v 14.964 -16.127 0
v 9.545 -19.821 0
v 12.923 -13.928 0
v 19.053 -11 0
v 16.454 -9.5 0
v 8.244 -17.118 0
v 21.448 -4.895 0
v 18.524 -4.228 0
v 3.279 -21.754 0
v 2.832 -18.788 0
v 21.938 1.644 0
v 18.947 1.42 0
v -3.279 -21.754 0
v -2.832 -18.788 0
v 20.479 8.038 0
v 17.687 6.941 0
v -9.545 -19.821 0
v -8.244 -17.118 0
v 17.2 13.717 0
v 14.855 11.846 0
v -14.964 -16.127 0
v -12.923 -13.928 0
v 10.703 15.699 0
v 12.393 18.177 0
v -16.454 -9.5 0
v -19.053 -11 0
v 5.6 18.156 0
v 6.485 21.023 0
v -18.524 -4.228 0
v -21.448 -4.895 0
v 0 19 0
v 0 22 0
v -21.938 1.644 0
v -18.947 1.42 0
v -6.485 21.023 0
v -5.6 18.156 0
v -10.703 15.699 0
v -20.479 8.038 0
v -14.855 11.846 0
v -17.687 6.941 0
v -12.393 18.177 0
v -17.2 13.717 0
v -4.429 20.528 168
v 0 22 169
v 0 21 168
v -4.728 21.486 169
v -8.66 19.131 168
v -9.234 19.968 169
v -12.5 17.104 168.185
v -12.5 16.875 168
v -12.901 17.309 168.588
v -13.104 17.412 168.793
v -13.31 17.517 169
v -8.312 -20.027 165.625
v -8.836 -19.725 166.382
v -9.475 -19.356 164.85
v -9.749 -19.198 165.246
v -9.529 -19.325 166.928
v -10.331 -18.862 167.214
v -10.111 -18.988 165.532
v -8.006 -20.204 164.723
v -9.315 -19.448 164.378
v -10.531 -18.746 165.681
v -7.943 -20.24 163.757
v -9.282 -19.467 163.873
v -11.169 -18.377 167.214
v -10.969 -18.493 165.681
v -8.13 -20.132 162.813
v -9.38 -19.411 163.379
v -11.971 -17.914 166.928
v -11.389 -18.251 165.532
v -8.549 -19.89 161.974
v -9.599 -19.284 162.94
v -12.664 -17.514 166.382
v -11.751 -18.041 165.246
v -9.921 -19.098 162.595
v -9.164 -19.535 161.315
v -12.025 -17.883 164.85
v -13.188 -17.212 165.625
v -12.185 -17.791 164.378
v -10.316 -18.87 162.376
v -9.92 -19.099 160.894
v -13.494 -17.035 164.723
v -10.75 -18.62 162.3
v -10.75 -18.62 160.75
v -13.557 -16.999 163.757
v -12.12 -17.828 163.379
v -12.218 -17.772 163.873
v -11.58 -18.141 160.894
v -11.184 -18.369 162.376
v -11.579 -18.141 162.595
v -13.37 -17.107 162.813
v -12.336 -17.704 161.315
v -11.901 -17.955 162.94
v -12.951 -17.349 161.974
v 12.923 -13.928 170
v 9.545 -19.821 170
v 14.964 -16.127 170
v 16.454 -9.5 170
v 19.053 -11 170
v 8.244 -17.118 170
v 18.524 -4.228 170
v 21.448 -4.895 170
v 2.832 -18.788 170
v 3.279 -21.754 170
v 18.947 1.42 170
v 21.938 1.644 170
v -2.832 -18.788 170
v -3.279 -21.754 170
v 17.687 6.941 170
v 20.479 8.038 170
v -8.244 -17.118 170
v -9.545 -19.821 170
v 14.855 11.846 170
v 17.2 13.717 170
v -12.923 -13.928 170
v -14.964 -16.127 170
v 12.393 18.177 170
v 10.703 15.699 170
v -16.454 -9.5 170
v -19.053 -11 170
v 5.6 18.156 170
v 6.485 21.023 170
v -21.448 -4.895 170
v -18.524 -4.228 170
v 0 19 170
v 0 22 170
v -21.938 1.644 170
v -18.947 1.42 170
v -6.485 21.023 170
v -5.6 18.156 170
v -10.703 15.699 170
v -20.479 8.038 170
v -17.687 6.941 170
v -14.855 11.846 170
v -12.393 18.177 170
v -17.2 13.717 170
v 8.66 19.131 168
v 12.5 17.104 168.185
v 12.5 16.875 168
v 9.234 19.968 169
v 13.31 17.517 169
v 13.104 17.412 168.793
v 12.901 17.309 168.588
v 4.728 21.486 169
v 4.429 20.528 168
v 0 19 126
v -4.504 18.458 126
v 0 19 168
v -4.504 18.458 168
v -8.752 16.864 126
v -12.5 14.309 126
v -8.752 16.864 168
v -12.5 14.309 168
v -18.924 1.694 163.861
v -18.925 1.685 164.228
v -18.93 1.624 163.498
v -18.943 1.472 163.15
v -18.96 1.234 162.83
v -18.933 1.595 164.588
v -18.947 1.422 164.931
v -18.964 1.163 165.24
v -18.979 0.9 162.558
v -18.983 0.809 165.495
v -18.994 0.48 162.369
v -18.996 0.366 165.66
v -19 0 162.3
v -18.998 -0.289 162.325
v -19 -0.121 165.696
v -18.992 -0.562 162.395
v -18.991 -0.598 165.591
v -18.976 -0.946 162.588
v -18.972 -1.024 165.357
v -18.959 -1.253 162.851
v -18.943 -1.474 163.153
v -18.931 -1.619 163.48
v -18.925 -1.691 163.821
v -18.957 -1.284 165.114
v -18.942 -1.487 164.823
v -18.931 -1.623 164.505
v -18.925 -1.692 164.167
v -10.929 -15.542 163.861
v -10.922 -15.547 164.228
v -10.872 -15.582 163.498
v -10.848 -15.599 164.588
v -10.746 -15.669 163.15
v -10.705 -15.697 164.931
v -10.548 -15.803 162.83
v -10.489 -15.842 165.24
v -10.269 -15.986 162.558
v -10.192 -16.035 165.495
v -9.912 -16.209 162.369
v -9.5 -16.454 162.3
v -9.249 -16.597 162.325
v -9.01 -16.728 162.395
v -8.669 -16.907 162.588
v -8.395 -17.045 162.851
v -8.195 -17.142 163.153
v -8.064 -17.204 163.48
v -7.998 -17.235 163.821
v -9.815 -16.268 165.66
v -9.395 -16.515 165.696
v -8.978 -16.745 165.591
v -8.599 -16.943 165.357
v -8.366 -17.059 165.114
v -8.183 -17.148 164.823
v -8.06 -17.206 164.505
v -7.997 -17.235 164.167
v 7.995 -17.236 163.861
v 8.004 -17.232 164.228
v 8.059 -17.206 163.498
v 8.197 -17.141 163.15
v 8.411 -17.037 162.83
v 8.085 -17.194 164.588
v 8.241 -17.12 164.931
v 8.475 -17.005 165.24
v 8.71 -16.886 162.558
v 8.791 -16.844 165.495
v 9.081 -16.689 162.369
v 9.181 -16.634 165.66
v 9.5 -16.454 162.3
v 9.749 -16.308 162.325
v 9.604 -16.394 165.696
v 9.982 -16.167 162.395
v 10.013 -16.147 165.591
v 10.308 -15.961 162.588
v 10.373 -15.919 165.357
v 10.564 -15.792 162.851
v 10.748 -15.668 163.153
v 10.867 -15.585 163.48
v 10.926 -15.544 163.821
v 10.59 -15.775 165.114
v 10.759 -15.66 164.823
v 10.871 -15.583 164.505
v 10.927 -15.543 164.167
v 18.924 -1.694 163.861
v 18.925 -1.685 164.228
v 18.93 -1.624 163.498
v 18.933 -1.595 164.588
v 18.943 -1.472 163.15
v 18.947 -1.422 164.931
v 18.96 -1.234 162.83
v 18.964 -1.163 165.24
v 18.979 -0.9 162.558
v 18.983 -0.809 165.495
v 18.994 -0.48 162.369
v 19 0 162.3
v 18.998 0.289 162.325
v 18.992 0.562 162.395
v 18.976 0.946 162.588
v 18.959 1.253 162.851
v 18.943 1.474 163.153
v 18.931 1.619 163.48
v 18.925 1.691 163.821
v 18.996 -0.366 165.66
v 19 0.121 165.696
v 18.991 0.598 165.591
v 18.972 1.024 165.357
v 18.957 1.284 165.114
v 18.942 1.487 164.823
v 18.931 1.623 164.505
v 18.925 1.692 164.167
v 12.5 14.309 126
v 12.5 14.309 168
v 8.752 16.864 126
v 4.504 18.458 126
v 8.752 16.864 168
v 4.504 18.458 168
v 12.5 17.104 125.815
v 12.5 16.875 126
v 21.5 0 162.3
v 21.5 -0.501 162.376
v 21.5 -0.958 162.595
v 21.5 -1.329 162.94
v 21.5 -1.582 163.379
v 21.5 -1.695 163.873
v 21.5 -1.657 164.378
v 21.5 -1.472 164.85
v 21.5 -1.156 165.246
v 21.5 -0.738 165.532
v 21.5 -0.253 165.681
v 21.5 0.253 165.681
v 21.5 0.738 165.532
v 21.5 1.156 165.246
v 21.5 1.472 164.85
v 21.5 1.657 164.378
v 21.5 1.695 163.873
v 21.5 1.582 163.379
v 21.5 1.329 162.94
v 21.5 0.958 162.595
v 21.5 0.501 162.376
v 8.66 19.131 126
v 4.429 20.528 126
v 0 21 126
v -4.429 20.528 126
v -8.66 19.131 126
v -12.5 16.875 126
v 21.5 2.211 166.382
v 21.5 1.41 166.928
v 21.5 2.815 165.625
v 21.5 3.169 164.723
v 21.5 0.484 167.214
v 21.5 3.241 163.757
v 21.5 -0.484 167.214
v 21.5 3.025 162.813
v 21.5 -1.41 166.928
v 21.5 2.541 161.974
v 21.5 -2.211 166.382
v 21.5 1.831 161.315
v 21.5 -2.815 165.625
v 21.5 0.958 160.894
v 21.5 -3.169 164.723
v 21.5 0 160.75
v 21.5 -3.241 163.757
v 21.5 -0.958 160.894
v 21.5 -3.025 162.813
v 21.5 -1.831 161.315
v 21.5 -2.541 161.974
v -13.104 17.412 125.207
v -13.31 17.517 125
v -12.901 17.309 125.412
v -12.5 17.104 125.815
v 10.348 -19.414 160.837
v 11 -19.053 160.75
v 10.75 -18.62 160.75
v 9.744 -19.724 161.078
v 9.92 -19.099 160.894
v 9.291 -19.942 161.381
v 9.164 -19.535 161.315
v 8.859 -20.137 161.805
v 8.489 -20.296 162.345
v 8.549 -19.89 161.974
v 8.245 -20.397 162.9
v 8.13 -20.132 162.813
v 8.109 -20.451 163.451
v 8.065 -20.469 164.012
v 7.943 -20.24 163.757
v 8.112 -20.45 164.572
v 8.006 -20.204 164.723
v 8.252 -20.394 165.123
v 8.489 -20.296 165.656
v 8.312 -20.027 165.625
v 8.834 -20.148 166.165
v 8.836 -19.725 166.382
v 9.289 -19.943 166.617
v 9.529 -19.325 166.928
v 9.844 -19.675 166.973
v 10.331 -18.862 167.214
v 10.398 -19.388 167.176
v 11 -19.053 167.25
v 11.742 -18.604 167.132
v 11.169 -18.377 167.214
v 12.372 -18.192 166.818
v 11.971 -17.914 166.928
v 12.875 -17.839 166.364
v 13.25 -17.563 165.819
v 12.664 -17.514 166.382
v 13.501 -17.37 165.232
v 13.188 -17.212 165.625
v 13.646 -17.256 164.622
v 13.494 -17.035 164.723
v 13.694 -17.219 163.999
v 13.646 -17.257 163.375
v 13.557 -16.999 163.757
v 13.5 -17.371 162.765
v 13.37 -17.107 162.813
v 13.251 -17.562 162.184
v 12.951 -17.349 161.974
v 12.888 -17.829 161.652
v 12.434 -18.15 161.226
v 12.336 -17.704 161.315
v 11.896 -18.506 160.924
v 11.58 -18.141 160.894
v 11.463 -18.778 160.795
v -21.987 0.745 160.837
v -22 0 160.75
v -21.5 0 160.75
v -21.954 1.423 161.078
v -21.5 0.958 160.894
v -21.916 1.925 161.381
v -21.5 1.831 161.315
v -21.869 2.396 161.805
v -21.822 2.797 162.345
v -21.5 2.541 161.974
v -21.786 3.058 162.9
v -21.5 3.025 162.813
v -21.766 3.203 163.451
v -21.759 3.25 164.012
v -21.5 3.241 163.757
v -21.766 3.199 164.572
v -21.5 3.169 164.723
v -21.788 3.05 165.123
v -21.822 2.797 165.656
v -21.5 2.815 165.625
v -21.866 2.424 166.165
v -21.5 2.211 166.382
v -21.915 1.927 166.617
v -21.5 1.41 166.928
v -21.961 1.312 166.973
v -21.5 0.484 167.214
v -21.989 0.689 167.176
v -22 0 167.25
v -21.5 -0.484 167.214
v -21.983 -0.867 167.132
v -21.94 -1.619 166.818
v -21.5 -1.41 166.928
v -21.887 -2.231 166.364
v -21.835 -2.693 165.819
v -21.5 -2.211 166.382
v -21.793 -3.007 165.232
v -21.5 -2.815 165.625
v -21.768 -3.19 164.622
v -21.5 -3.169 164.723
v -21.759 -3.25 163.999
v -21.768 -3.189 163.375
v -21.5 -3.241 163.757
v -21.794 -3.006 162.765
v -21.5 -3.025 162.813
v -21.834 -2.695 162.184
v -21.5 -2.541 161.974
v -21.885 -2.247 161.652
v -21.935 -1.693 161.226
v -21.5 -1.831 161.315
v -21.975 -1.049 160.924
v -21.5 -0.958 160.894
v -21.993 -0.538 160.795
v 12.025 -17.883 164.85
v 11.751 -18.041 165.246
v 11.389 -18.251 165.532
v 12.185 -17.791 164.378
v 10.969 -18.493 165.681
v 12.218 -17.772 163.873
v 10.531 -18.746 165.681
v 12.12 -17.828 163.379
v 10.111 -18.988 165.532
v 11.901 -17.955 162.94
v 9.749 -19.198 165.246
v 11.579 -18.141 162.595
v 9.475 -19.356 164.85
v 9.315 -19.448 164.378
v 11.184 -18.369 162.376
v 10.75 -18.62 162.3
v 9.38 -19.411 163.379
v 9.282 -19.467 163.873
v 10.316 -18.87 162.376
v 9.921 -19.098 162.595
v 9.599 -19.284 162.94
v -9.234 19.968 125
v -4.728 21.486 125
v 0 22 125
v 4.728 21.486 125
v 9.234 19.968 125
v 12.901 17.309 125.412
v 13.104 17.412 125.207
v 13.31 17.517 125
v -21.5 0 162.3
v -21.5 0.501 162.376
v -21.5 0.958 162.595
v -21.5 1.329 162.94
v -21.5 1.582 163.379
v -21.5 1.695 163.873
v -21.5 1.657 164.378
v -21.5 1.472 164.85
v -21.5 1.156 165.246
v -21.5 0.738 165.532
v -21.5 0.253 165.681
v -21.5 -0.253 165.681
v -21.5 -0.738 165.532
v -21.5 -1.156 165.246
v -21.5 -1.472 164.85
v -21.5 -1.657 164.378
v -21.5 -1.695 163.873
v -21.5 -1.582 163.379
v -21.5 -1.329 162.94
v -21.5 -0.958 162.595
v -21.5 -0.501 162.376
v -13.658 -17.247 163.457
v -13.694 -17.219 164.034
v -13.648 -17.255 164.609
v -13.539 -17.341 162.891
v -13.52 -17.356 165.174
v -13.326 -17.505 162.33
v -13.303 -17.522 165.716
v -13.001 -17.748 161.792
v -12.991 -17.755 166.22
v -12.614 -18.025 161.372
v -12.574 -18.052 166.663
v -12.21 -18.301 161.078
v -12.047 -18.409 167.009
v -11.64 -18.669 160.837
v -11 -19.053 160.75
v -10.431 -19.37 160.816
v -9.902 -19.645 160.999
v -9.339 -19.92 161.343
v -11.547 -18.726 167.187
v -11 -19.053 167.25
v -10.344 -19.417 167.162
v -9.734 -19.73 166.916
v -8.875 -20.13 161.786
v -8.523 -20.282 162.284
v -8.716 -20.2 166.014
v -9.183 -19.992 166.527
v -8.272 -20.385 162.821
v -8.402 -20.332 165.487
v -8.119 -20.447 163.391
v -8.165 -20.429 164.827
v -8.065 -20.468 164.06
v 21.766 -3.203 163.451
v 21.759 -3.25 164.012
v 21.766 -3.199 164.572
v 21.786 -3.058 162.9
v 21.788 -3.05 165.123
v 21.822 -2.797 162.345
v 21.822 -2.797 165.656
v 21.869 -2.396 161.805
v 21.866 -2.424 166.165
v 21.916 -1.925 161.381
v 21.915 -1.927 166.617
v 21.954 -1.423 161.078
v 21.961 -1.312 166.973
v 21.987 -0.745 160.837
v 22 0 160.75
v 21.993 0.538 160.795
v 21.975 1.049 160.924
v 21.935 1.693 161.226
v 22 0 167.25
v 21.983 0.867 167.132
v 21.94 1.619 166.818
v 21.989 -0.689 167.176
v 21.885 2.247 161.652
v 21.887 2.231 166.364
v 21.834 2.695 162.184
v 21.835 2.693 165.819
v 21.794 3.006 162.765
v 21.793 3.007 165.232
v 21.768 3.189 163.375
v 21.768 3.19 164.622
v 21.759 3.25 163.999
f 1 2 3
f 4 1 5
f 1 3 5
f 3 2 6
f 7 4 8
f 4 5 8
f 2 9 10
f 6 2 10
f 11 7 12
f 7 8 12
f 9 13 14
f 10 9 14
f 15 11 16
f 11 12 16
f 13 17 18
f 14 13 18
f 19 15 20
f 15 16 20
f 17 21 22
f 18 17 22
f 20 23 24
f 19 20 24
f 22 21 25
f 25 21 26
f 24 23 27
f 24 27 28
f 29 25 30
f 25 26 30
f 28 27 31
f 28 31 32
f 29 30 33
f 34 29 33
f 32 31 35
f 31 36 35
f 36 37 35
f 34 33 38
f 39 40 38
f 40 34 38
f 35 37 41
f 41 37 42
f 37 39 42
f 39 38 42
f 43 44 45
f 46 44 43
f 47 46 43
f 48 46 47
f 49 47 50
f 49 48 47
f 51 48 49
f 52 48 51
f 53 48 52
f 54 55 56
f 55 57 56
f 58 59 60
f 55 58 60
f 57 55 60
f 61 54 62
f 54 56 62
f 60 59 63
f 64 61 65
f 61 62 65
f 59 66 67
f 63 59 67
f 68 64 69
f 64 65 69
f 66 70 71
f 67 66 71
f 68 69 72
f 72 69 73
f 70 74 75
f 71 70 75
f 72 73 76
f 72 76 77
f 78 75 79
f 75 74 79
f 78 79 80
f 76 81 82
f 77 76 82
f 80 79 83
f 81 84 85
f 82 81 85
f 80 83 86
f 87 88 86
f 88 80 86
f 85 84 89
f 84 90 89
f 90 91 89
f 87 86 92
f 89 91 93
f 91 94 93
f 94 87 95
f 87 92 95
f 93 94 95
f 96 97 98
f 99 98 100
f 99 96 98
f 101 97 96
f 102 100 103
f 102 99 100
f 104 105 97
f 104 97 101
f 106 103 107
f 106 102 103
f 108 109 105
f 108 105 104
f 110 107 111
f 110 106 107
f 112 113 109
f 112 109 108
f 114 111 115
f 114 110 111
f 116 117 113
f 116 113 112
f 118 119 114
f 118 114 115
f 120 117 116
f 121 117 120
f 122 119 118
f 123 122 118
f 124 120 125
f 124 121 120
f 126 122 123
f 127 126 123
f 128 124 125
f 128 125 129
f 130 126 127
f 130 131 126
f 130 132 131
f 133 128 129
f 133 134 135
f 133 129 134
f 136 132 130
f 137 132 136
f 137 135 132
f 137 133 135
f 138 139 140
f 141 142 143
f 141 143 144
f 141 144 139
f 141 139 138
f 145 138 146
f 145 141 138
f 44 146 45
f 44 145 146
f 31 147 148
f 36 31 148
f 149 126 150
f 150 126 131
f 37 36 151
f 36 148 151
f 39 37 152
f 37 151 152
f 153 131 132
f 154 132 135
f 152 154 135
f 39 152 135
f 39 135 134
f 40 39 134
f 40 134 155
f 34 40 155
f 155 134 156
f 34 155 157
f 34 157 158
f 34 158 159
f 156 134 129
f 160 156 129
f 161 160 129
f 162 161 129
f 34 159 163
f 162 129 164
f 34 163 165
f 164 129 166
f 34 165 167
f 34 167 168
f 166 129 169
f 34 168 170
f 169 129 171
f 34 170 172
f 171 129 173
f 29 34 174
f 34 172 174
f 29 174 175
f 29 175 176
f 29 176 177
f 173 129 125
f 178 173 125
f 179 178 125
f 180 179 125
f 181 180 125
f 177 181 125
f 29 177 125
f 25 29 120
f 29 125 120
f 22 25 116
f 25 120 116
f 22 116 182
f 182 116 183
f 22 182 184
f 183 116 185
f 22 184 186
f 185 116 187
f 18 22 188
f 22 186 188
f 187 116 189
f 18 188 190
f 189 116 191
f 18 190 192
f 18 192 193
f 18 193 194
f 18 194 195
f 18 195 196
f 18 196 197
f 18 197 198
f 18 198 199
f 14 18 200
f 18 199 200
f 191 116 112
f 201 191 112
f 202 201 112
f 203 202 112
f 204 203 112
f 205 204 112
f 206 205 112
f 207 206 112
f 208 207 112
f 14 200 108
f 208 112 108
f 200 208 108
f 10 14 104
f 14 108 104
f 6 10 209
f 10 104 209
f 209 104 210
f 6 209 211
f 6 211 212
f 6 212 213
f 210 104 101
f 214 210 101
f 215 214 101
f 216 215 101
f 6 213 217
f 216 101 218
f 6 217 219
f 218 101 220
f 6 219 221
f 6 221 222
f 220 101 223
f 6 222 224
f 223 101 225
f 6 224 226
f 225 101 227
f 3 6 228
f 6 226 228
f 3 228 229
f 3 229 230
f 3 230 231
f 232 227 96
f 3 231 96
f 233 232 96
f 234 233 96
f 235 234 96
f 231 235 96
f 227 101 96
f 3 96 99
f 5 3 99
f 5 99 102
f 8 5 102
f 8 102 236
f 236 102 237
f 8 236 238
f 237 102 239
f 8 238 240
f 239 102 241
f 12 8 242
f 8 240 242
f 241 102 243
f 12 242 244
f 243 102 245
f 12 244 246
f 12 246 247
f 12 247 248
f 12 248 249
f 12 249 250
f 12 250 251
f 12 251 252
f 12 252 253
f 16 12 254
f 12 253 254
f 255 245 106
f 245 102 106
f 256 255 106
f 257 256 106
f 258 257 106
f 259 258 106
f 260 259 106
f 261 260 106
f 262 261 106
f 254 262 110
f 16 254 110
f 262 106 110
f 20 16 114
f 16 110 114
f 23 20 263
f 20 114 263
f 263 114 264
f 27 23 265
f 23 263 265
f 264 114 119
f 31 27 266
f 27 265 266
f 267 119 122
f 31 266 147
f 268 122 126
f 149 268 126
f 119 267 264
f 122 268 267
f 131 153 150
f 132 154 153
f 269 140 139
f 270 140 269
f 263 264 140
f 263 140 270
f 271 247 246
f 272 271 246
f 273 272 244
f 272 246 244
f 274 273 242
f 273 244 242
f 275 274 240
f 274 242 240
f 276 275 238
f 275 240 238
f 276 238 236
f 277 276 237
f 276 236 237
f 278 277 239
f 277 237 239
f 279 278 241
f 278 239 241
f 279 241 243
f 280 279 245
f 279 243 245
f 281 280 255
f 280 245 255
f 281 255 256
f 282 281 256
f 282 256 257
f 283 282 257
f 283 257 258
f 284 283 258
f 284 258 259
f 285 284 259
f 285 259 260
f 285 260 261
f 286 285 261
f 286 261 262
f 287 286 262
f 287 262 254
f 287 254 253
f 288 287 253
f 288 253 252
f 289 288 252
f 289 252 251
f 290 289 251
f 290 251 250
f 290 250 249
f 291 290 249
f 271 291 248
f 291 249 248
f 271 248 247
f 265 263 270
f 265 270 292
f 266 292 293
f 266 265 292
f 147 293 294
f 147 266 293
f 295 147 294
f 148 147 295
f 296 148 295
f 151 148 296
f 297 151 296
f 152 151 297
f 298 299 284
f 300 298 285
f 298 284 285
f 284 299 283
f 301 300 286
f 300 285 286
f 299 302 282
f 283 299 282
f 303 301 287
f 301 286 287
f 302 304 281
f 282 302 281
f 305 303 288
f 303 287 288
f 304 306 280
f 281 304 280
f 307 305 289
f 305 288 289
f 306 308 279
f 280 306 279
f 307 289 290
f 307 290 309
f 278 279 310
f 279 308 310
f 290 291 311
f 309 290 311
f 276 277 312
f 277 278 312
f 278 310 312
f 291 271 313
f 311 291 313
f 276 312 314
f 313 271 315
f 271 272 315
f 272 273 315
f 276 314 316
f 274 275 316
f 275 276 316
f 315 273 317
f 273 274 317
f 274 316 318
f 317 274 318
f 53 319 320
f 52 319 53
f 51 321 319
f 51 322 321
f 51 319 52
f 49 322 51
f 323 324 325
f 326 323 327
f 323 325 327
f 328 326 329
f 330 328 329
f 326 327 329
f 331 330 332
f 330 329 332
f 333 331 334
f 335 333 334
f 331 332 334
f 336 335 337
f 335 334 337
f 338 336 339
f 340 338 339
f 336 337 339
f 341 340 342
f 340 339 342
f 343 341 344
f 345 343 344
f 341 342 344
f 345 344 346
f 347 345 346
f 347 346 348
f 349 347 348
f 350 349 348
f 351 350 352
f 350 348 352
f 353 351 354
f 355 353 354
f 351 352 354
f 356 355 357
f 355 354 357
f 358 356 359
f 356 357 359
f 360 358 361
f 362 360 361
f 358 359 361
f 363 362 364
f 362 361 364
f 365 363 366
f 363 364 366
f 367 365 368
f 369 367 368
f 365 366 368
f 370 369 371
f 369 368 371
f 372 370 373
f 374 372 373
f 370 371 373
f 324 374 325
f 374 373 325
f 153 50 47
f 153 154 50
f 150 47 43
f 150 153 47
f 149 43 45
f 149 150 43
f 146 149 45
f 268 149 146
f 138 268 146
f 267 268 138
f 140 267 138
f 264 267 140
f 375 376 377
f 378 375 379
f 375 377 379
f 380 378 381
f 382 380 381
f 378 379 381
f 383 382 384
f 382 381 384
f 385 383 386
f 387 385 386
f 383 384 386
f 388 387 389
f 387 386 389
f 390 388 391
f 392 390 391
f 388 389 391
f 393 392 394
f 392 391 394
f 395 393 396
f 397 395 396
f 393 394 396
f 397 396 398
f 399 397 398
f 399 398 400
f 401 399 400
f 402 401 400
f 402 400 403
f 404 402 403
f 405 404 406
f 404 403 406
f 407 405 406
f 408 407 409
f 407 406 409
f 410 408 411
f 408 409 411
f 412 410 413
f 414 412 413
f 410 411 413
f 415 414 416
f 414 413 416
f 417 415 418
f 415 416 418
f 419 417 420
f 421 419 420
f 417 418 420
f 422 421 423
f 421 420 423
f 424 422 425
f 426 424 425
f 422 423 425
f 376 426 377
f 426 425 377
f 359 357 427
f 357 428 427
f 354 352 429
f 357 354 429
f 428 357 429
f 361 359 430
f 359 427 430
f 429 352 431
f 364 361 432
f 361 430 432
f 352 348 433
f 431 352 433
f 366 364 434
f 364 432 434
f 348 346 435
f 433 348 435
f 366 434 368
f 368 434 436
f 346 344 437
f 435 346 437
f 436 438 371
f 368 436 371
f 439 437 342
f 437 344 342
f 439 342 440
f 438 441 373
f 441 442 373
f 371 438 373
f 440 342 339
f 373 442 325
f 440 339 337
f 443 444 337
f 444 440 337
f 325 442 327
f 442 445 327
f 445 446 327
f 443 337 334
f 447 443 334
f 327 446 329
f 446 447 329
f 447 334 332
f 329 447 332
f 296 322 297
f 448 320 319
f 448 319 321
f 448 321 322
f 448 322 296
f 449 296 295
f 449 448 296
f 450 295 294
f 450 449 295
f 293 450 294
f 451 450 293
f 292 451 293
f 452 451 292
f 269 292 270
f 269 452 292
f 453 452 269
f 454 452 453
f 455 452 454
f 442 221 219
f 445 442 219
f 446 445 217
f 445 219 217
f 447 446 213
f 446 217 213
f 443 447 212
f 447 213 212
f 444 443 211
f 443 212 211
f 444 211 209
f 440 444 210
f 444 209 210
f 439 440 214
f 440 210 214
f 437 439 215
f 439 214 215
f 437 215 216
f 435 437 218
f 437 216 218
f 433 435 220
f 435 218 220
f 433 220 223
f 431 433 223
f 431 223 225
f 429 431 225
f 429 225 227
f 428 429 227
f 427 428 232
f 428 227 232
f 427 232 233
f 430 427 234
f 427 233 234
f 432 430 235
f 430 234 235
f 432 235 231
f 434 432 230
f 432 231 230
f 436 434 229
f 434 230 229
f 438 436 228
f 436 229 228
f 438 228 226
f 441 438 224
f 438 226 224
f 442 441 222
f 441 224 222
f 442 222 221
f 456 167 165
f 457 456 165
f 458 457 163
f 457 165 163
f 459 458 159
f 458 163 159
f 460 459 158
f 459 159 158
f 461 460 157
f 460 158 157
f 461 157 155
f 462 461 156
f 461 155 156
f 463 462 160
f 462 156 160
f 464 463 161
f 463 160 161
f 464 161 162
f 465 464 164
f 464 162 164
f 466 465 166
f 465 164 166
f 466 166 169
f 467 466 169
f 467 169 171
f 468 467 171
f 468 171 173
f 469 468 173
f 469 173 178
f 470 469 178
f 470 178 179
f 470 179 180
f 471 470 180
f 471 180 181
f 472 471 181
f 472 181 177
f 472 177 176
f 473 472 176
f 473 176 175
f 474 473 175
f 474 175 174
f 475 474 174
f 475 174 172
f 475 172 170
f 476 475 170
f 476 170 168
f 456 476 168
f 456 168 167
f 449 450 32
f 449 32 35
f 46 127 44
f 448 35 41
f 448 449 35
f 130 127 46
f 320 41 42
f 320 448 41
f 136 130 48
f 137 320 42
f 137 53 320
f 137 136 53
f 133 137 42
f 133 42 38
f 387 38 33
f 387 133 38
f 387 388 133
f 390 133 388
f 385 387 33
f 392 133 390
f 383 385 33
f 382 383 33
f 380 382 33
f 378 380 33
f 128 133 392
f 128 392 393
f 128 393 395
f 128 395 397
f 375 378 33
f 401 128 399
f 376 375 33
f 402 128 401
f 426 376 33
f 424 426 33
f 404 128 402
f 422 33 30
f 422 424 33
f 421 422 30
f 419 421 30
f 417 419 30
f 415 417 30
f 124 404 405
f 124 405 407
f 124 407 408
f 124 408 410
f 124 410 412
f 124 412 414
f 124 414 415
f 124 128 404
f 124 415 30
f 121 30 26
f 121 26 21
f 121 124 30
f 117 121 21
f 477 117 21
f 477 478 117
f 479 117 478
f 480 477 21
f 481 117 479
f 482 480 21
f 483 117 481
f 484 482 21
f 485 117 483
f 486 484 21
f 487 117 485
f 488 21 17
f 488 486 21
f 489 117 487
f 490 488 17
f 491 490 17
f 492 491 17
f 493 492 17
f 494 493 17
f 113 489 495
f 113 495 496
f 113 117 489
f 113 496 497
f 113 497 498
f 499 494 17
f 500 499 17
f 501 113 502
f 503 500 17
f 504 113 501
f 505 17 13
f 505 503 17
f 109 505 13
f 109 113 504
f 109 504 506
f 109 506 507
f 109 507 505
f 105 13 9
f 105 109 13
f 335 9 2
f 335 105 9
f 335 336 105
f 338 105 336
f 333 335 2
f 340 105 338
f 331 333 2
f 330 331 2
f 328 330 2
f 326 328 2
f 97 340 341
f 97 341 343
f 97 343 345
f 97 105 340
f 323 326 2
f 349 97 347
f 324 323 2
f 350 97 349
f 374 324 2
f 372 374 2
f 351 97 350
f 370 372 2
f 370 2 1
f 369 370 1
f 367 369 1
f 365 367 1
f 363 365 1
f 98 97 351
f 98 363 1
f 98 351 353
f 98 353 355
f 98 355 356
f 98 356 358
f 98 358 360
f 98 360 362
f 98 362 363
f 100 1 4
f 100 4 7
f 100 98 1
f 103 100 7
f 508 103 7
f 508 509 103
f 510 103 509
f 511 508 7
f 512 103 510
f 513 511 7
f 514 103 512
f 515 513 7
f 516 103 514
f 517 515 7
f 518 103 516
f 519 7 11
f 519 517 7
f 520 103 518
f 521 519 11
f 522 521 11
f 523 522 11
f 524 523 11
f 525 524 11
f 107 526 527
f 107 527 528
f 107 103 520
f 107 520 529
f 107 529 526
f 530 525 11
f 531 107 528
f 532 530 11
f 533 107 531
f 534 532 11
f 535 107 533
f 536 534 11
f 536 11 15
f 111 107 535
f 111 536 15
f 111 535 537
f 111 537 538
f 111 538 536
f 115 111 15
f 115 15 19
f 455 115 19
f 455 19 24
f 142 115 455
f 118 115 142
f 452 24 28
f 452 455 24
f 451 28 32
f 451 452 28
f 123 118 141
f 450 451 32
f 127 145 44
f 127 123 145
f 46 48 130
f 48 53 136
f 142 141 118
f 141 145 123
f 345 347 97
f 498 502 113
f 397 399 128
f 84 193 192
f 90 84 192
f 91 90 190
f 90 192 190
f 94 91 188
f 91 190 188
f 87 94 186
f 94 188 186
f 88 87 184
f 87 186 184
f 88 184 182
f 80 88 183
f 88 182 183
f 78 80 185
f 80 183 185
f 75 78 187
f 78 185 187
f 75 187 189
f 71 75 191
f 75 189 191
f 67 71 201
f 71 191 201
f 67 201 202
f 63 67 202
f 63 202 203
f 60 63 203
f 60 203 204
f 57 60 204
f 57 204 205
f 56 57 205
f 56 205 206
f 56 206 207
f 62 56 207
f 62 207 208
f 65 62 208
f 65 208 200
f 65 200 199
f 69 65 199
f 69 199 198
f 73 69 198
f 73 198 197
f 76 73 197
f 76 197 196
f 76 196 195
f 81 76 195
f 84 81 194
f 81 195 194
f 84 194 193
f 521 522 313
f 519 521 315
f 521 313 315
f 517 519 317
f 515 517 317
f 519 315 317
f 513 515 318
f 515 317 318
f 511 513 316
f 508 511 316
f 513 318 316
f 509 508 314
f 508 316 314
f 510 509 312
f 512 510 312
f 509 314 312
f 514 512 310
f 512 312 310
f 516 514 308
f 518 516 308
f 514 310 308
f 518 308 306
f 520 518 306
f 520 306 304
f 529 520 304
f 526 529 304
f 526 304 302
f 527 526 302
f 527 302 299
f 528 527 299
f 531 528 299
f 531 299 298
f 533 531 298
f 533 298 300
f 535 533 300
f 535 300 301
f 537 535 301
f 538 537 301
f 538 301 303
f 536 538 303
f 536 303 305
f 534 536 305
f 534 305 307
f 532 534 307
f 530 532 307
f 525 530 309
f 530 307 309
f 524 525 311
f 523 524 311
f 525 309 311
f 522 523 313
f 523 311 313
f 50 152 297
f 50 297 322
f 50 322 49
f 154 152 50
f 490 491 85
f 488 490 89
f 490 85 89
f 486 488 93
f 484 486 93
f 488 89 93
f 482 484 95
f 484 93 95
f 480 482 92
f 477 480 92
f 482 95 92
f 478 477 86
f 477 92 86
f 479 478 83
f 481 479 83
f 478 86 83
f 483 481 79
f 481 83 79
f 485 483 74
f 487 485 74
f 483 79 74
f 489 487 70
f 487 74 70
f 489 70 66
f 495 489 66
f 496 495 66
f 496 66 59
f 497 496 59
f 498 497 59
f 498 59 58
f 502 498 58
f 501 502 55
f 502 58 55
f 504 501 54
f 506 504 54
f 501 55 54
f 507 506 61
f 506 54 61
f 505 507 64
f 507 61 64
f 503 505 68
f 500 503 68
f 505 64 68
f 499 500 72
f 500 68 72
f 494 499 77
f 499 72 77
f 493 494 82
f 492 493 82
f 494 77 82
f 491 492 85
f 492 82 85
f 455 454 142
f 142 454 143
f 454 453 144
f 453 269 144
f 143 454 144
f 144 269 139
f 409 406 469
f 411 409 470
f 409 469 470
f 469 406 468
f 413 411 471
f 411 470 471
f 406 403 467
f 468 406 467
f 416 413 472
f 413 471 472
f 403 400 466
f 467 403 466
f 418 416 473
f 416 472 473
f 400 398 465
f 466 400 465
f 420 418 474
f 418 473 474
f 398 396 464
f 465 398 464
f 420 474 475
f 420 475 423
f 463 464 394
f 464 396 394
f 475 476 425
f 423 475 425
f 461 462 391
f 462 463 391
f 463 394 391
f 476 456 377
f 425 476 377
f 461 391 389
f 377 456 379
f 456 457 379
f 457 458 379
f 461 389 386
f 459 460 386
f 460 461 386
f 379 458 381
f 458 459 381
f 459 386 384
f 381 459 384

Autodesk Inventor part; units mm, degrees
ref_plane "XY Plane" through (0, 0, 0) normal (0, 0, 1) x (1, 0, 0)
sketch "Esquisse1" plane through (0, 0, 0) normal (1, 0, 0) x (0, 1, 0)
  line L0 (0, 0) -> (0, 594.5025)
  line L1 (22, 0) -> (22, 170)
  line L2 (19, 0) -> (19, 170)
  line L3 (22, 170) -> (19, 170)
  line L4 (22, 0) -> (19, 0)
  dimension "d0" = 38
  dimension "d3" = 3
  dimension "d58" = 170
revolve "Révolution1" add sketch "Esquisse1" angle 360 about axis through (0, 0, 0) along (0, 0, 1)
sketch "Esquisse3" plane through (0, 0, 0) normal (0, 1, 0) x (-1, 0, 0)
  line L0 (-19, 170) -> (19, 170) projected
  line L1 (12.5, 168) -> (-12.5, 168)
  line L2 (-12.5, 168) -> (-12.5, 126)
  line L3 (-12.5, 126) -> (12.5, 126)
  line L4 (12.5, 126) -> (12.5, 168)
  point P0 (0, 0)
  point P1 (0, 168)
  point P2 (0, 170)
  dimension "d108" = 42
  dimension "d109" = 2
  dimension "d110" = 25
extrude "Extrusion2" cut sketch "Esquisse3" along normal up to surface
ref_plane "Plan de construction2" through (22, 0, 85) normal (1, 0, 0) x (0, 1, 0)
sketch "Esquisse4" plane through (22, 0, 85) normal (1, 0, 0) x (0, 1, 0)
  line L0 (-22, 85) -> (22, 85) projected
  point P0 (0, -85)
  point P1 (0, 79)
  dimension "d24" = 6
hole "Perçage1" at (22, 0, 164) direction (-1, 0, 0) diameter 3.4 depth 8 counterbore diameter 6.5 counterbore depth 0.5 clearance for "Vis d'assemblage à six pans creux ISO 4762" size "M3" standard "ISO"
pattern_circular "Réseau circulaire2" count 4 over 180 about axis through (0, 0, -10) along (0, 0, -1) of "Perçage1"
chamfer "Chanfrein2" distance 1 angle 45 6 edges at (-12.5, 18.1039, 147) (-6.5466, 21.0034, 126) (6.5466, 21.0034, 126) (12.5, 18.1039, 147) (-6.5466, 21.0034, 168) (6.5466, 21.0034, 168)
ref_plane "Plan de construction3" through (0, -22, 85) normal (0, 1, 0) x (-1, 0, 0)
thread "Filetage3" size "M38x1.5" class "6H" standard "ISO Metric profile" length 10
properties part number "reservoir_guide"
